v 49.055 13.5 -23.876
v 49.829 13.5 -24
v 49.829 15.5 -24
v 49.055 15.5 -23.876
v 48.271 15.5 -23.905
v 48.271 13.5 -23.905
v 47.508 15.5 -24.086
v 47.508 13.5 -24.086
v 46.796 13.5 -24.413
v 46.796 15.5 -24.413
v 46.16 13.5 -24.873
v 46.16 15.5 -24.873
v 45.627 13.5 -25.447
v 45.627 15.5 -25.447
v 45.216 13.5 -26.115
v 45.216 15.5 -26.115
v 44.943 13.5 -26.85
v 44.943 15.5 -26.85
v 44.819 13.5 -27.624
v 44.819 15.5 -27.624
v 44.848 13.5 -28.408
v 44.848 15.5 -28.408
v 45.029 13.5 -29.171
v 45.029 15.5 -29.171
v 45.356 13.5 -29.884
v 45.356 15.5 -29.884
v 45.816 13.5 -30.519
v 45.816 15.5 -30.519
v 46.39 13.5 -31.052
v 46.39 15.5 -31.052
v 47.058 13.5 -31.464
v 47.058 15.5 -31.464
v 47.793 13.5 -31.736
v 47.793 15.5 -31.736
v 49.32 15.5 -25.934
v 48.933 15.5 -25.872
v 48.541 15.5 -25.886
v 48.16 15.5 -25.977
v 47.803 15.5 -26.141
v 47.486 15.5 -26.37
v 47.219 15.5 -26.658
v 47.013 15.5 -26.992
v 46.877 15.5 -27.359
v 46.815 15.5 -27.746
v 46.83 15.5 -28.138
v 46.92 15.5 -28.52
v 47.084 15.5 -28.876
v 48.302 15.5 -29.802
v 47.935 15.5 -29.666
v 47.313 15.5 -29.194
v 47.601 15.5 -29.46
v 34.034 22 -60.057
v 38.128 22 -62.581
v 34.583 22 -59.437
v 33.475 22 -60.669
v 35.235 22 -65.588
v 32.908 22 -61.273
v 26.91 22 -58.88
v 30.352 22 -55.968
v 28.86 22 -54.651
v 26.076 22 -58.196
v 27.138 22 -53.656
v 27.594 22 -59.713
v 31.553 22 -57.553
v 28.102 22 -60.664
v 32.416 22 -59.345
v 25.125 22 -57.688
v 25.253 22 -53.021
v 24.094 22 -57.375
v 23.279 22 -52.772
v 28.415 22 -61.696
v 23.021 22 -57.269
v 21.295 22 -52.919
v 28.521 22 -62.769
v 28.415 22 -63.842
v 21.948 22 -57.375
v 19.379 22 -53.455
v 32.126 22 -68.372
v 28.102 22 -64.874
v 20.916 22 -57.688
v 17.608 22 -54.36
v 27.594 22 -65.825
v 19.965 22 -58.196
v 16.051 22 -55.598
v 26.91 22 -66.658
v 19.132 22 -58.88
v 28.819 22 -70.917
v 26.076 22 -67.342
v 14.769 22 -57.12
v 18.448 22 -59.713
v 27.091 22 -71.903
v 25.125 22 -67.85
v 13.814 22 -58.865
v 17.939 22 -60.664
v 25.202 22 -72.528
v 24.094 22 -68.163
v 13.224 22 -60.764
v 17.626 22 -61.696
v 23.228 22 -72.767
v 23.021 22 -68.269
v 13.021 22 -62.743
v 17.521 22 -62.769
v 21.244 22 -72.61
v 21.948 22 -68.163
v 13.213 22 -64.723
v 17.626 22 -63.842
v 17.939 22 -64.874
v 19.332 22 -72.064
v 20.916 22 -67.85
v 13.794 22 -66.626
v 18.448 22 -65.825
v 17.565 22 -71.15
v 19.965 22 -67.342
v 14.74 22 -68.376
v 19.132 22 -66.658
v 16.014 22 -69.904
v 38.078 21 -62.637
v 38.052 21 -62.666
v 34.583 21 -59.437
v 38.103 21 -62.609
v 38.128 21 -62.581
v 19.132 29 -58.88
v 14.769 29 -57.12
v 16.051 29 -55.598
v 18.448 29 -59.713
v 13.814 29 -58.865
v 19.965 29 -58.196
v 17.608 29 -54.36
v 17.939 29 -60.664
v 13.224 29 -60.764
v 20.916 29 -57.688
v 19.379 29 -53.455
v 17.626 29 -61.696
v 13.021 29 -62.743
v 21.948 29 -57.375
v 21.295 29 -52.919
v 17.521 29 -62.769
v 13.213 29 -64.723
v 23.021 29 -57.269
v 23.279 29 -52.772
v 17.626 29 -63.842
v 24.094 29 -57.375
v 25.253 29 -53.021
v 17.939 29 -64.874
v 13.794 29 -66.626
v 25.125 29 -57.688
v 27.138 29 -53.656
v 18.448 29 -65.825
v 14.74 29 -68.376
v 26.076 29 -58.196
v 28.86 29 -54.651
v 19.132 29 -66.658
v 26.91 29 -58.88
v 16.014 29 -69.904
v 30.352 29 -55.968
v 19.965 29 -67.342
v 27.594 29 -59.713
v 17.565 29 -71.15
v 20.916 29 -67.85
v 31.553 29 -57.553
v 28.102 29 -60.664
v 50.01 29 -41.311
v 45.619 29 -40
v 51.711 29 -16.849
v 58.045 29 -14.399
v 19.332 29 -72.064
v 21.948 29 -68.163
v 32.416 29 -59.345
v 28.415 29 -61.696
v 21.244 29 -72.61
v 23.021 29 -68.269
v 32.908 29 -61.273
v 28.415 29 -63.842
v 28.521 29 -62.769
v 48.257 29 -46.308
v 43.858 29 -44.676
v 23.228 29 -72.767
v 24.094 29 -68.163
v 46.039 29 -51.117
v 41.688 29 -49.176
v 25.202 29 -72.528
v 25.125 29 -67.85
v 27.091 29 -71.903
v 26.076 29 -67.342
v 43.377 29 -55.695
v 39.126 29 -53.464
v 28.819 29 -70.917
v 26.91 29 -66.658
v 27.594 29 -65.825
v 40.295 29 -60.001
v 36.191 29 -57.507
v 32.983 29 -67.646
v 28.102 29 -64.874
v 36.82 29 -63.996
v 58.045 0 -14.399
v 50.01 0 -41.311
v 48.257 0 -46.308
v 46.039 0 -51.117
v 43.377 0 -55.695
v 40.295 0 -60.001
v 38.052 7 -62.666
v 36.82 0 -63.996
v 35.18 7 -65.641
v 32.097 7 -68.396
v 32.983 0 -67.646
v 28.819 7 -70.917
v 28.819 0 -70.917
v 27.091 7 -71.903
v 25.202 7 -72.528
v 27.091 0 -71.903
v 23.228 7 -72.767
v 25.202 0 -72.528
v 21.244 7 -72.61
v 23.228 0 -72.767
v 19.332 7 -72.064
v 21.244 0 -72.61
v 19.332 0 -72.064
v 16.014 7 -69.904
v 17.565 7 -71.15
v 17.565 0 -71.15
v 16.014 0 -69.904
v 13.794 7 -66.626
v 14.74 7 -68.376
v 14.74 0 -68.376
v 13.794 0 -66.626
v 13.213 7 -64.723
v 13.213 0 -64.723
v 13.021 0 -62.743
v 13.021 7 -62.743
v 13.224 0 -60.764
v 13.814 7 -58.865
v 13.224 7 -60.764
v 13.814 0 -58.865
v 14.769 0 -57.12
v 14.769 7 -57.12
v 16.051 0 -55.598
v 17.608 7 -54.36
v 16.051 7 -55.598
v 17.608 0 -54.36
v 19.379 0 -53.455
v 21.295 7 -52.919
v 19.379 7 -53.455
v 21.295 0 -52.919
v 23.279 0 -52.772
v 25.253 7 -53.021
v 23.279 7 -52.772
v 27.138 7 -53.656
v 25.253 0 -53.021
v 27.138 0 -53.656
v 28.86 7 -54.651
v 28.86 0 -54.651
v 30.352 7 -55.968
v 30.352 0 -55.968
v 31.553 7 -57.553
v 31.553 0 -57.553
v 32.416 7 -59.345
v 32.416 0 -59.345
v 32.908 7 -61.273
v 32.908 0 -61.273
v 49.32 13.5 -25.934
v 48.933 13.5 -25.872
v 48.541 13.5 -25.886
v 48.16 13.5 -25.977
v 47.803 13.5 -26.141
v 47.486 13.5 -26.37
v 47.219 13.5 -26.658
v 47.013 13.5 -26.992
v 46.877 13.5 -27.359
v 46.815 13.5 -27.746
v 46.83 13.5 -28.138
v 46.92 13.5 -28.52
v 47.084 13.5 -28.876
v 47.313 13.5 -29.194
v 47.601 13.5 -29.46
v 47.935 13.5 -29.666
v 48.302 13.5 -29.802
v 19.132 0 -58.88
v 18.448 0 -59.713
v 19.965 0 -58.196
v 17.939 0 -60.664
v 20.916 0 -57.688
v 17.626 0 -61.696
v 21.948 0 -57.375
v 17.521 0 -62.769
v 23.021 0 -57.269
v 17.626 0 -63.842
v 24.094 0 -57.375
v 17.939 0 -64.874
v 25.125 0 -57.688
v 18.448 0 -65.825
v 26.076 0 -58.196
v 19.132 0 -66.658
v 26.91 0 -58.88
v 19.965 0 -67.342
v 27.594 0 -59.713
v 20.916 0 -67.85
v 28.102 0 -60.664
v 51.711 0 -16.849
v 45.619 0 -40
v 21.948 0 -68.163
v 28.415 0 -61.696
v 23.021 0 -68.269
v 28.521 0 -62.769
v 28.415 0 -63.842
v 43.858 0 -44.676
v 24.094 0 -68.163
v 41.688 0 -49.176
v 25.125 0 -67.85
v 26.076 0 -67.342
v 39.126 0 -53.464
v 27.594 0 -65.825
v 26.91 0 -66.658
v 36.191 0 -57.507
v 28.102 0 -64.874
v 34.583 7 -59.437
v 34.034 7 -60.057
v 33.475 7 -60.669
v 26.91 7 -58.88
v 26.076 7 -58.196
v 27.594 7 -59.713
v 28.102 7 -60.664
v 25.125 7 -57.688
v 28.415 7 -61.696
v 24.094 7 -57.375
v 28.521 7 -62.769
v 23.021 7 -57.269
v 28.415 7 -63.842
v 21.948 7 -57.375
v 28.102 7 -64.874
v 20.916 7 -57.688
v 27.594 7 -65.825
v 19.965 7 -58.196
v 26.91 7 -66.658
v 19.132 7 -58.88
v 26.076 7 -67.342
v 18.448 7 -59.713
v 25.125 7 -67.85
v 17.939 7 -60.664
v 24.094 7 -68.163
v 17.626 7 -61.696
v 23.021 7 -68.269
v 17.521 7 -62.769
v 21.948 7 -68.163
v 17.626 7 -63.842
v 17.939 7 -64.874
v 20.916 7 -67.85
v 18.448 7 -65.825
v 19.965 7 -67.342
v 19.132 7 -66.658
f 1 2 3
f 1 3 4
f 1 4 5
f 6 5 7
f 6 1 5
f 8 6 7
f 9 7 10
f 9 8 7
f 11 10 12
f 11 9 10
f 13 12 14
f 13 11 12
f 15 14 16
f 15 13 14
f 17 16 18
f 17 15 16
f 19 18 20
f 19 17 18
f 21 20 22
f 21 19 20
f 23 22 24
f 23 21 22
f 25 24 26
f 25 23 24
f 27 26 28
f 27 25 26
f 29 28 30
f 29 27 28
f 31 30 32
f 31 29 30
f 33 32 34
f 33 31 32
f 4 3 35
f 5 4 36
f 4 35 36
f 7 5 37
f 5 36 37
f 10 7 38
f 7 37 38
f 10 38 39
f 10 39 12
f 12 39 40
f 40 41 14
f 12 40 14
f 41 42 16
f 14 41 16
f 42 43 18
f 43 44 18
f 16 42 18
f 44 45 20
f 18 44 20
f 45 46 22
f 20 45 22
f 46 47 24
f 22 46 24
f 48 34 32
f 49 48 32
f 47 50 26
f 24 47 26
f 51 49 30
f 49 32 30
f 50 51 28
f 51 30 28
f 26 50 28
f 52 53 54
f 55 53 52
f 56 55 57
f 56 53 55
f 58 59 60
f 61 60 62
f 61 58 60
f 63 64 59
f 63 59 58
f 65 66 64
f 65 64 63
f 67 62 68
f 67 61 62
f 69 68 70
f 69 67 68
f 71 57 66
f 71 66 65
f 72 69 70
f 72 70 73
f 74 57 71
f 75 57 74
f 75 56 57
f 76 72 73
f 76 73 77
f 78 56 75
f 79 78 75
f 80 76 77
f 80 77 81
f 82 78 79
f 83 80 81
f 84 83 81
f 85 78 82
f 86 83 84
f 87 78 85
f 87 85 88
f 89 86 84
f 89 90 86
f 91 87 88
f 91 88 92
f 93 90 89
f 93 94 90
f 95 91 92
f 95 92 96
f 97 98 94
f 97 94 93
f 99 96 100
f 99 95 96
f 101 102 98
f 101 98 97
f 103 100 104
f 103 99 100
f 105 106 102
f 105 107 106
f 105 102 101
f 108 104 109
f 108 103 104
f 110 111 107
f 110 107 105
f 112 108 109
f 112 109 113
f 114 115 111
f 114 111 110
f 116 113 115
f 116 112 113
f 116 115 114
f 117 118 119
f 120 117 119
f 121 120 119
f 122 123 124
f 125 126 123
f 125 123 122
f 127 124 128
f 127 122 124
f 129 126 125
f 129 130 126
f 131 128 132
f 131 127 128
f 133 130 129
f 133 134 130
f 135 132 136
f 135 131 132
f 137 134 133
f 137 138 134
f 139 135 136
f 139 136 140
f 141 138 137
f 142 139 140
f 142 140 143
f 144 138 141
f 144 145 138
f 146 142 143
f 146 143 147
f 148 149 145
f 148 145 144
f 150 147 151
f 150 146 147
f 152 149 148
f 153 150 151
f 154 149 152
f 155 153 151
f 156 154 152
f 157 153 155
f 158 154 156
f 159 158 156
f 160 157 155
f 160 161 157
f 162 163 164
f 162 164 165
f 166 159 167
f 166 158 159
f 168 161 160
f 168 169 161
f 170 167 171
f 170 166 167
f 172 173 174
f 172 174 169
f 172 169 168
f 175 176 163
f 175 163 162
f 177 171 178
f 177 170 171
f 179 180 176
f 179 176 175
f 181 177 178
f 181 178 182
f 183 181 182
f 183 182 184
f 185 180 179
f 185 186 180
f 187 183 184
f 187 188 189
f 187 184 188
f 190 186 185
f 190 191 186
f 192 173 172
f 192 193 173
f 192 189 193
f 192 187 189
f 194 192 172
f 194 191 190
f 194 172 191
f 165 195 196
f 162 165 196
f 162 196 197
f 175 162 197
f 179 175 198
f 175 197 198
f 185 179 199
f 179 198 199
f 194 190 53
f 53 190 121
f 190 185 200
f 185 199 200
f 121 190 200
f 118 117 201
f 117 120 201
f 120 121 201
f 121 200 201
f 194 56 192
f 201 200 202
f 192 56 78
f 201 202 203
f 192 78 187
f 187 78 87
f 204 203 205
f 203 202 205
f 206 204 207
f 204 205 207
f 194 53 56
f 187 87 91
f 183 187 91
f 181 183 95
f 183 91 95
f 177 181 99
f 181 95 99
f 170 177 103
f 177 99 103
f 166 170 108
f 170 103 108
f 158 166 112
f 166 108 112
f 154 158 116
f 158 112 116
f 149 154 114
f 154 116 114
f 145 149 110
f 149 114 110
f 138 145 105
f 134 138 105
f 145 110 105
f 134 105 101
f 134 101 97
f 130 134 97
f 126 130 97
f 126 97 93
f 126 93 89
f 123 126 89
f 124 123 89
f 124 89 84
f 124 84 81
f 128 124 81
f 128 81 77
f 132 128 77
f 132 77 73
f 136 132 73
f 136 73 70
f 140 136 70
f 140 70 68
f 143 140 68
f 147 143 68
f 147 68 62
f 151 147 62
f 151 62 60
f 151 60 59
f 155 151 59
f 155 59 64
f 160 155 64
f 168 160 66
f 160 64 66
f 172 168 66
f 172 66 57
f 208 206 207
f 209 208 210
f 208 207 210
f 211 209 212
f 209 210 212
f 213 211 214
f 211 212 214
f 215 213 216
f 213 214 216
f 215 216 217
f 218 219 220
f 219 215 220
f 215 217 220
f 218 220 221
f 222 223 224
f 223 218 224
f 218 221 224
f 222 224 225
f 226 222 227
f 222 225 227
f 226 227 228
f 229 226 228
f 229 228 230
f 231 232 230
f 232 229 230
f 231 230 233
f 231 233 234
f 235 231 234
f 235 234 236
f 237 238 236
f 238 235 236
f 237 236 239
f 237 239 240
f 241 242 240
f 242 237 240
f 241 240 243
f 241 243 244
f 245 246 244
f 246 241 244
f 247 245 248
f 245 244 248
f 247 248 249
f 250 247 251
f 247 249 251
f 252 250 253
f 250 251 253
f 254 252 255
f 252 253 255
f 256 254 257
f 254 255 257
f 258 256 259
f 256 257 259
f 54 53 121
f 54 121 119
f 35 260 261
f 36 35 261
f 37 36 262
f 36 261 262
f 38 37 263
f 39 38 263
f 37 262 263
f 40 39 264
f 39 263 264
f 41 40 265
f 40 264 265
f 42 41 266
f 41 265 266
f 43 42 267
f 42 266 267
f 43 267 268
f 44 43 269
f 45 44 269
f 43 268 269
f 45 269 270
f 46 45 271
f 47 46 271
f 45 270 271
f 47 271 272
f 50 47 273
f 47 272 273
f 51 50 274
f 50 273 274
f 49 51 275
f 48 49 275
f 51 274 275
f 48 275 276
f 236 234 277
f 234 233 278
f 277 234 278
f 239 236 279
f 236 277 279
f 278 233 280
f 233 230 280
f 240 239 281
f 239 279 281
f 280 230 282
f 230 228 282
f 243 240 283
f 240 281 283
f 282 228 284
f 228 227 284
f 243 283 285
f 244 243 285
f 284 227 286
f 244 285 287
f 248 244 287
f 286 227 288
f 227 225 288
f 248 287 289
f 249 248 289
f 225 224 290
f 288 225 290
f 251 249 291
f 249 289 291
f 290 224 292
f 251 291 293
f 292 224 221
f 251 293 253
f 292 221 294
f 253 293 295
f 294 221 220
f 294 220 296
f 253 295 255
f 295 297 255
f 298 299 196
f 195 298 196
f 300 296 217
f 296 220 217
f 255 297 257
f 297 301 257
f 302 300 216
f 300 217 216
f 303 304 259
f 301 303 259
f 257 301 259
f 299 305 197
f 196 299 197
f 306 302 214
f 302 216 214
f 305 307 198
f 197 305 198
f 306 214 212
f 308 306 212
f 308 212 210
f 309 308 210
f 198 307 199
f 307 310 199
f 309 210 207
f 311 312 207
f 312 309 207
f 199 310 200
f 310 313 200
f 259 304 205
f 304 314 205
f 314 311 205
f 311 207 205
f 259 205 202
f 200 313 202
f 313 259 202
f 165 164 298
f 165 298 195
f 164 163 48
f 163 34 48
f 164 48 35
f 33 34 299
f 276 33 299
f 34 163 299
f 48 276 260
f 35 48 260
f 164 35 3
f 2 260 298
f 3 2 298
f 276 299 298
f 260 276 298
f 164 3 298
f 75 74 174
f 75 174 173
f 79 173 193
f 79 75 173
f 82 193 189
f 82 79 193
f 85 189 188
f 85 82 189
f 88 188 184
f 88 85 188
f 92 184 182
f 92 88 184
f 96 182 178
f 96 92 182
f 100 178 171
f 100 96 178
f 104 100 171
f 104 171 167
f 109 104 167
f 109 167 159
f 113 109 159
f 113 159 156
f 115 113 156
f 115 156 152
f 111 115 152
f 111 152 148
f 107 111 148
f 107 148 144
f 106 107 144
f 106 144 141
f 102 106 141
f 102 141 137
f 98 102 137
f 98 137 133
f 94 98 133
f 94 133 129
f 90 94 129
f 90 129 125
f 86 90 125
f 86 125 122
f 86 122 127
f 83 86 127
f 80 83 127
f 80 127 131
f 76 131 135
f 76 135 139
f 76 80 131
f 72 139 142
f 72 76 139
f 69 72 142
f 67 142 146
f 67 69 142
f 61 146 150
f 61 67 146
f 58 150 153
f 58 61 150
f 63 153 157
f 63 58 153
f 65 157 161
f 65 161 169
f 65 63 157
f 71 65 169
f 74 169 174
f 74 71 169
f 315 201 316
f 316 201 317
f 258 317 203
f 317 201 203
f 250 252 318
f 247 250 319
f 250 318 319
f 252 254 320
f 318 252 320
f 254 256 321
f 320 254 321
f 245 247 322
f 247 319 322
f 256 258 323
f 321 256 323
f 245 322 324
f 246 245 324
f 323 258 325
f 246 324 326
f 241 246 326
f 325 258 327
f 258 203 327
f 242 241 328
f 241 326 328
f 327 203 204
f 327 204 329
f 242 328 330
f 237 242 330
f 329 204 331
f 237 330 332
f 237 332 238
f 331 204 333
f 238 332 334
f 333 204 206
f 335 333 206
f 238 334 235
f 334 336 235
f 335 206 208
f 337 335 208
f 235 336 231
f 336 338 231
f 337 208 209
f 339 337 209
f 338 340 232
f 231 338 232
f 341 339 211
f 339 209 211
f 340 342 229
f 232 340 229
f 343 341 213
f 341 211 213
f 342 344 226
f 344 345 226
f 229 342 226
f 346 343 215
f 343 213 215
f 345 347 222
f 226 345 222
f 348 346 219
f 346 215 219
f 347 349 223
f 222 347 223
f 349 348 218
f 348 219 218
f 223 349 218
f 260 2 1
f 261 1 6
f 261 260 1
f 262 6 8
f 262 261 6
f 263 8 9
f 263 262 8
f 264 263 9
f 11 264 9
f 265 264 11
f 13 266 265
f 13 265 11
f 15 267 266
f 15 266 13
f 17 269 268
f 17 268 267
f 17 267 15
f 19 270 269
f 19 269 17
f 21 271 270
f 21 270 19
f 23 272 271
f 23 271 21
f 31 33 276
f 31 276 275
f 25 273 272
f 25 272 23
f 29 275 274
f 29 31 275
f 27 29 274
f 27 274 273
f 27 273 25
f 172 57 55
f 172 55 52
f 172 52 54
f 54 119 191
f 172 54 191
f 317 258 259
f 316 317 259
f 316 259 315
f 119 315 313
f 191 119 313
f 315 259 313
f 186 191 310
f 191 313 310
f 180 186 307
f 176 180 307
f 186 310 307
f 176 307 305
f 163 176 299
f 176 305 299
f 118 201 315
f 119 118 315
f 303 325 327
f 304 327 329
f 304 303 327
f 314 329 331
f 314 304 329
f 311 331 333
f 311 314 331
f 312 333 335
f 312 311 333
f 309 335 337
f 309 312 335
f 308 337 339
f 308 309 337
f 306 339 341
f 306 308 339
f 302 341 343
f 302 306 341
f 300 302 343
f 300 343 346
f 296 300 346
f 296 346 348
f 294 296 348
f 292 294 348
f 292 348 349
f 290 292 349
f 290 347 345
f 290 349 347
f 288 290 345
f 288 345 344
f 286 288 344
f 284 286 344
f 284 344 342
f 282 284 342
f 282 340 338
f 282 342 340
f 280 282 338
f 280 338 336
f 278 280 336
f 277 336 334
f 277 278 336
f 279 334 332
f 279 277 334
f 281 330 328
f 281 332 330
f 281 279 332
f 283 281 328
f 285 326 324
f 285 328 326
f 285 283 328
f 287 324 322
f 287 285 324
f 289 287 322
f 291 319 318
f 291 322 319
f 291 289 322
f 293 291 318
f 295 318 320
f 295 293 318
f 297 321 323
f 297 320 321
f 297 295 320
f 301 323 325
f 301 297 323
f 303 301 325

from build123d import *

# Parameters (mm, degrees)
SKETCH2_R                = 5.5
BOSS_EXTRUDE1_DEPTH      = 29
SKETCH3_R                = 12
CUT_EXTRUDE2_DEPTH       = 14
SKETCH5_R                = 4
SKETCH5_R_2              = 2
BOSS_EXTRUDE2_DEPTH      = 1
BOSS_EXTRUDE2_DEPTH_BACK = 1
SKETCH6_R                = 12
CUT_EXTRUDE3_DEPTH       = 1


with BuildPart() as part:
    # Sketch2 → Boss-Extrude1 (new body)
    with BuildSketch(Plane(origin=(0, 0, 0), x_dir=(1, 0, 0), z_dir=(0, 1, 0))):
        with BuildLine():
            ThreePointArc((50.009794046, 41.311227393), (41.887297641, 57.884223181), (28.818508763, 70.916716976))
            ThreePointArc((28.818508763, 70.916716976), (13.814285335, 58.864855467), (32.908133208, 61.2729792))
            ThreePointArc((32.908133208, 61.2729792), (40.45496434, 51.34849017), (45.618872448, 40.00017771))
            Line((45.618872448, 40.00017771), (51.710808427, 16.848599978))
            Line((51.710808427, 16.848599978), (58.045348615, 14.398829975))
            Line((58.045348615, 14.398829975), (50.009794046, 41.311227393))
        make_face()
        with Locations((23.020672213, 62.769012309)):
            Circle(SKETCH2_R, mode=Mode.SUBTRACT)
    extrude(amount=BOSS_EXTRUDE1_DEPTH)

    # Sketch3 → Cut-Extrude2 (cut)
    with BuildSketch(Plane(origin=(0, 7, 0), x_dir=(-1, 0, 0), z_dir=(0, -1, 0))):
        Polygon((-39.772770103, 64.267022184), (-15.893793884, 42.042250192), (-0.061179653, 60.713204229), (-23.940155872, 82.937976221), align=None)
        with Locations((-23.020672213, 62.769012309)):
            Circle(SKETCH3_R, mode=Mode.SUBTRACT)
        with BuildLine():
            ThreePointArc((-11.020672213, 62.769012309), (-24.725973403, 74.647225468), (-34.535996855, 59.393023803))
            Line((-34.535996855, 59.393023803), (-25.562701432, 51.041348968))
            ThreePointArc((-25.562701432, 51.041348968), (-15.487557008, 53.428125022), (-11.020672213, 62.769012309))
        make_face()
        with BuildLine():
            Line((-25.562701432, 51.041348968), (-34.535996855, 59.393023803))
            ThreePointArc((-34.535996855, 59.393023803), (-31.196240544, 53.984931113), (-25.562701432, 51.041348968))
        make_face()
    extrude(amount=-CUT_EXTRUDE2_DEPTH, mode=Mode.SUBTRACT)

    # Sketch5 → Boss-Extrude2 (add, two sides)
    with BuildSketch(Plane(origin=(0, 14.5, 0), x_dir=(-1, 0, 0), z_dir=(0, -1, 0))) as boss_extrude2_sk:
        with Locations((-48.811207054, 27.868142339)):
            Circle(SKETCH5_R)
        with Locations((-48.811207054, 27.868142339)):
            Circle(SKETCH5_R_2, mode=Mode.SUBTRACT)
    extrude(amount=BOSS_EXTRUDE2_DEPTH)
    extrude(boss_extrude2_sk.sketch, amount=-BOSS_EXTRUDE2_DEPTH_BACK)

    # Sketch6 → Cut-Extrude3 (cut)
    with BuildSketch(Plane(origin=(0, 22, 0), x_dir=(1, 0, 0), z_dir=(0, 1, 0))):
        Polygon((39.538971905, 63.831822433), (17.017916797, 43.859723681), (2.667298857, 64.33781743), (24.409587021, 83.619290887), align=None)
        with Locations((23.020672213, 62.769012309)):
            Circle(SKETCH6_R, mode=Mode.SUBTRACT)
        with BuildLine():
            ThreePointArc((24.993041452, 50.932215463), (30.982651495, 53.790878543), (34.536814652, 59.395814522))
            Line((34.536814652, 59.395814522), (24.993041452, 50.932215463))
        make_face()
        with BuildLine():
            Line((24.993041452, 50.932215463), (34.536814652, 59.395814522))
            ThreePointArc((34.536814652, 59.395814522), (34.899091916, 61.065150413), (35.020672213, 62.769012309))
            ThreePointArc((35.020672213, 62.769012309), (13.86456958, 70.525672967), (24.993041452, 50.932215463))
        make_face()
    extrude(amount=-CUT_EXTRUDE3_DEPTH, mode=Mode.SUBTRACT)


solid = part.part
